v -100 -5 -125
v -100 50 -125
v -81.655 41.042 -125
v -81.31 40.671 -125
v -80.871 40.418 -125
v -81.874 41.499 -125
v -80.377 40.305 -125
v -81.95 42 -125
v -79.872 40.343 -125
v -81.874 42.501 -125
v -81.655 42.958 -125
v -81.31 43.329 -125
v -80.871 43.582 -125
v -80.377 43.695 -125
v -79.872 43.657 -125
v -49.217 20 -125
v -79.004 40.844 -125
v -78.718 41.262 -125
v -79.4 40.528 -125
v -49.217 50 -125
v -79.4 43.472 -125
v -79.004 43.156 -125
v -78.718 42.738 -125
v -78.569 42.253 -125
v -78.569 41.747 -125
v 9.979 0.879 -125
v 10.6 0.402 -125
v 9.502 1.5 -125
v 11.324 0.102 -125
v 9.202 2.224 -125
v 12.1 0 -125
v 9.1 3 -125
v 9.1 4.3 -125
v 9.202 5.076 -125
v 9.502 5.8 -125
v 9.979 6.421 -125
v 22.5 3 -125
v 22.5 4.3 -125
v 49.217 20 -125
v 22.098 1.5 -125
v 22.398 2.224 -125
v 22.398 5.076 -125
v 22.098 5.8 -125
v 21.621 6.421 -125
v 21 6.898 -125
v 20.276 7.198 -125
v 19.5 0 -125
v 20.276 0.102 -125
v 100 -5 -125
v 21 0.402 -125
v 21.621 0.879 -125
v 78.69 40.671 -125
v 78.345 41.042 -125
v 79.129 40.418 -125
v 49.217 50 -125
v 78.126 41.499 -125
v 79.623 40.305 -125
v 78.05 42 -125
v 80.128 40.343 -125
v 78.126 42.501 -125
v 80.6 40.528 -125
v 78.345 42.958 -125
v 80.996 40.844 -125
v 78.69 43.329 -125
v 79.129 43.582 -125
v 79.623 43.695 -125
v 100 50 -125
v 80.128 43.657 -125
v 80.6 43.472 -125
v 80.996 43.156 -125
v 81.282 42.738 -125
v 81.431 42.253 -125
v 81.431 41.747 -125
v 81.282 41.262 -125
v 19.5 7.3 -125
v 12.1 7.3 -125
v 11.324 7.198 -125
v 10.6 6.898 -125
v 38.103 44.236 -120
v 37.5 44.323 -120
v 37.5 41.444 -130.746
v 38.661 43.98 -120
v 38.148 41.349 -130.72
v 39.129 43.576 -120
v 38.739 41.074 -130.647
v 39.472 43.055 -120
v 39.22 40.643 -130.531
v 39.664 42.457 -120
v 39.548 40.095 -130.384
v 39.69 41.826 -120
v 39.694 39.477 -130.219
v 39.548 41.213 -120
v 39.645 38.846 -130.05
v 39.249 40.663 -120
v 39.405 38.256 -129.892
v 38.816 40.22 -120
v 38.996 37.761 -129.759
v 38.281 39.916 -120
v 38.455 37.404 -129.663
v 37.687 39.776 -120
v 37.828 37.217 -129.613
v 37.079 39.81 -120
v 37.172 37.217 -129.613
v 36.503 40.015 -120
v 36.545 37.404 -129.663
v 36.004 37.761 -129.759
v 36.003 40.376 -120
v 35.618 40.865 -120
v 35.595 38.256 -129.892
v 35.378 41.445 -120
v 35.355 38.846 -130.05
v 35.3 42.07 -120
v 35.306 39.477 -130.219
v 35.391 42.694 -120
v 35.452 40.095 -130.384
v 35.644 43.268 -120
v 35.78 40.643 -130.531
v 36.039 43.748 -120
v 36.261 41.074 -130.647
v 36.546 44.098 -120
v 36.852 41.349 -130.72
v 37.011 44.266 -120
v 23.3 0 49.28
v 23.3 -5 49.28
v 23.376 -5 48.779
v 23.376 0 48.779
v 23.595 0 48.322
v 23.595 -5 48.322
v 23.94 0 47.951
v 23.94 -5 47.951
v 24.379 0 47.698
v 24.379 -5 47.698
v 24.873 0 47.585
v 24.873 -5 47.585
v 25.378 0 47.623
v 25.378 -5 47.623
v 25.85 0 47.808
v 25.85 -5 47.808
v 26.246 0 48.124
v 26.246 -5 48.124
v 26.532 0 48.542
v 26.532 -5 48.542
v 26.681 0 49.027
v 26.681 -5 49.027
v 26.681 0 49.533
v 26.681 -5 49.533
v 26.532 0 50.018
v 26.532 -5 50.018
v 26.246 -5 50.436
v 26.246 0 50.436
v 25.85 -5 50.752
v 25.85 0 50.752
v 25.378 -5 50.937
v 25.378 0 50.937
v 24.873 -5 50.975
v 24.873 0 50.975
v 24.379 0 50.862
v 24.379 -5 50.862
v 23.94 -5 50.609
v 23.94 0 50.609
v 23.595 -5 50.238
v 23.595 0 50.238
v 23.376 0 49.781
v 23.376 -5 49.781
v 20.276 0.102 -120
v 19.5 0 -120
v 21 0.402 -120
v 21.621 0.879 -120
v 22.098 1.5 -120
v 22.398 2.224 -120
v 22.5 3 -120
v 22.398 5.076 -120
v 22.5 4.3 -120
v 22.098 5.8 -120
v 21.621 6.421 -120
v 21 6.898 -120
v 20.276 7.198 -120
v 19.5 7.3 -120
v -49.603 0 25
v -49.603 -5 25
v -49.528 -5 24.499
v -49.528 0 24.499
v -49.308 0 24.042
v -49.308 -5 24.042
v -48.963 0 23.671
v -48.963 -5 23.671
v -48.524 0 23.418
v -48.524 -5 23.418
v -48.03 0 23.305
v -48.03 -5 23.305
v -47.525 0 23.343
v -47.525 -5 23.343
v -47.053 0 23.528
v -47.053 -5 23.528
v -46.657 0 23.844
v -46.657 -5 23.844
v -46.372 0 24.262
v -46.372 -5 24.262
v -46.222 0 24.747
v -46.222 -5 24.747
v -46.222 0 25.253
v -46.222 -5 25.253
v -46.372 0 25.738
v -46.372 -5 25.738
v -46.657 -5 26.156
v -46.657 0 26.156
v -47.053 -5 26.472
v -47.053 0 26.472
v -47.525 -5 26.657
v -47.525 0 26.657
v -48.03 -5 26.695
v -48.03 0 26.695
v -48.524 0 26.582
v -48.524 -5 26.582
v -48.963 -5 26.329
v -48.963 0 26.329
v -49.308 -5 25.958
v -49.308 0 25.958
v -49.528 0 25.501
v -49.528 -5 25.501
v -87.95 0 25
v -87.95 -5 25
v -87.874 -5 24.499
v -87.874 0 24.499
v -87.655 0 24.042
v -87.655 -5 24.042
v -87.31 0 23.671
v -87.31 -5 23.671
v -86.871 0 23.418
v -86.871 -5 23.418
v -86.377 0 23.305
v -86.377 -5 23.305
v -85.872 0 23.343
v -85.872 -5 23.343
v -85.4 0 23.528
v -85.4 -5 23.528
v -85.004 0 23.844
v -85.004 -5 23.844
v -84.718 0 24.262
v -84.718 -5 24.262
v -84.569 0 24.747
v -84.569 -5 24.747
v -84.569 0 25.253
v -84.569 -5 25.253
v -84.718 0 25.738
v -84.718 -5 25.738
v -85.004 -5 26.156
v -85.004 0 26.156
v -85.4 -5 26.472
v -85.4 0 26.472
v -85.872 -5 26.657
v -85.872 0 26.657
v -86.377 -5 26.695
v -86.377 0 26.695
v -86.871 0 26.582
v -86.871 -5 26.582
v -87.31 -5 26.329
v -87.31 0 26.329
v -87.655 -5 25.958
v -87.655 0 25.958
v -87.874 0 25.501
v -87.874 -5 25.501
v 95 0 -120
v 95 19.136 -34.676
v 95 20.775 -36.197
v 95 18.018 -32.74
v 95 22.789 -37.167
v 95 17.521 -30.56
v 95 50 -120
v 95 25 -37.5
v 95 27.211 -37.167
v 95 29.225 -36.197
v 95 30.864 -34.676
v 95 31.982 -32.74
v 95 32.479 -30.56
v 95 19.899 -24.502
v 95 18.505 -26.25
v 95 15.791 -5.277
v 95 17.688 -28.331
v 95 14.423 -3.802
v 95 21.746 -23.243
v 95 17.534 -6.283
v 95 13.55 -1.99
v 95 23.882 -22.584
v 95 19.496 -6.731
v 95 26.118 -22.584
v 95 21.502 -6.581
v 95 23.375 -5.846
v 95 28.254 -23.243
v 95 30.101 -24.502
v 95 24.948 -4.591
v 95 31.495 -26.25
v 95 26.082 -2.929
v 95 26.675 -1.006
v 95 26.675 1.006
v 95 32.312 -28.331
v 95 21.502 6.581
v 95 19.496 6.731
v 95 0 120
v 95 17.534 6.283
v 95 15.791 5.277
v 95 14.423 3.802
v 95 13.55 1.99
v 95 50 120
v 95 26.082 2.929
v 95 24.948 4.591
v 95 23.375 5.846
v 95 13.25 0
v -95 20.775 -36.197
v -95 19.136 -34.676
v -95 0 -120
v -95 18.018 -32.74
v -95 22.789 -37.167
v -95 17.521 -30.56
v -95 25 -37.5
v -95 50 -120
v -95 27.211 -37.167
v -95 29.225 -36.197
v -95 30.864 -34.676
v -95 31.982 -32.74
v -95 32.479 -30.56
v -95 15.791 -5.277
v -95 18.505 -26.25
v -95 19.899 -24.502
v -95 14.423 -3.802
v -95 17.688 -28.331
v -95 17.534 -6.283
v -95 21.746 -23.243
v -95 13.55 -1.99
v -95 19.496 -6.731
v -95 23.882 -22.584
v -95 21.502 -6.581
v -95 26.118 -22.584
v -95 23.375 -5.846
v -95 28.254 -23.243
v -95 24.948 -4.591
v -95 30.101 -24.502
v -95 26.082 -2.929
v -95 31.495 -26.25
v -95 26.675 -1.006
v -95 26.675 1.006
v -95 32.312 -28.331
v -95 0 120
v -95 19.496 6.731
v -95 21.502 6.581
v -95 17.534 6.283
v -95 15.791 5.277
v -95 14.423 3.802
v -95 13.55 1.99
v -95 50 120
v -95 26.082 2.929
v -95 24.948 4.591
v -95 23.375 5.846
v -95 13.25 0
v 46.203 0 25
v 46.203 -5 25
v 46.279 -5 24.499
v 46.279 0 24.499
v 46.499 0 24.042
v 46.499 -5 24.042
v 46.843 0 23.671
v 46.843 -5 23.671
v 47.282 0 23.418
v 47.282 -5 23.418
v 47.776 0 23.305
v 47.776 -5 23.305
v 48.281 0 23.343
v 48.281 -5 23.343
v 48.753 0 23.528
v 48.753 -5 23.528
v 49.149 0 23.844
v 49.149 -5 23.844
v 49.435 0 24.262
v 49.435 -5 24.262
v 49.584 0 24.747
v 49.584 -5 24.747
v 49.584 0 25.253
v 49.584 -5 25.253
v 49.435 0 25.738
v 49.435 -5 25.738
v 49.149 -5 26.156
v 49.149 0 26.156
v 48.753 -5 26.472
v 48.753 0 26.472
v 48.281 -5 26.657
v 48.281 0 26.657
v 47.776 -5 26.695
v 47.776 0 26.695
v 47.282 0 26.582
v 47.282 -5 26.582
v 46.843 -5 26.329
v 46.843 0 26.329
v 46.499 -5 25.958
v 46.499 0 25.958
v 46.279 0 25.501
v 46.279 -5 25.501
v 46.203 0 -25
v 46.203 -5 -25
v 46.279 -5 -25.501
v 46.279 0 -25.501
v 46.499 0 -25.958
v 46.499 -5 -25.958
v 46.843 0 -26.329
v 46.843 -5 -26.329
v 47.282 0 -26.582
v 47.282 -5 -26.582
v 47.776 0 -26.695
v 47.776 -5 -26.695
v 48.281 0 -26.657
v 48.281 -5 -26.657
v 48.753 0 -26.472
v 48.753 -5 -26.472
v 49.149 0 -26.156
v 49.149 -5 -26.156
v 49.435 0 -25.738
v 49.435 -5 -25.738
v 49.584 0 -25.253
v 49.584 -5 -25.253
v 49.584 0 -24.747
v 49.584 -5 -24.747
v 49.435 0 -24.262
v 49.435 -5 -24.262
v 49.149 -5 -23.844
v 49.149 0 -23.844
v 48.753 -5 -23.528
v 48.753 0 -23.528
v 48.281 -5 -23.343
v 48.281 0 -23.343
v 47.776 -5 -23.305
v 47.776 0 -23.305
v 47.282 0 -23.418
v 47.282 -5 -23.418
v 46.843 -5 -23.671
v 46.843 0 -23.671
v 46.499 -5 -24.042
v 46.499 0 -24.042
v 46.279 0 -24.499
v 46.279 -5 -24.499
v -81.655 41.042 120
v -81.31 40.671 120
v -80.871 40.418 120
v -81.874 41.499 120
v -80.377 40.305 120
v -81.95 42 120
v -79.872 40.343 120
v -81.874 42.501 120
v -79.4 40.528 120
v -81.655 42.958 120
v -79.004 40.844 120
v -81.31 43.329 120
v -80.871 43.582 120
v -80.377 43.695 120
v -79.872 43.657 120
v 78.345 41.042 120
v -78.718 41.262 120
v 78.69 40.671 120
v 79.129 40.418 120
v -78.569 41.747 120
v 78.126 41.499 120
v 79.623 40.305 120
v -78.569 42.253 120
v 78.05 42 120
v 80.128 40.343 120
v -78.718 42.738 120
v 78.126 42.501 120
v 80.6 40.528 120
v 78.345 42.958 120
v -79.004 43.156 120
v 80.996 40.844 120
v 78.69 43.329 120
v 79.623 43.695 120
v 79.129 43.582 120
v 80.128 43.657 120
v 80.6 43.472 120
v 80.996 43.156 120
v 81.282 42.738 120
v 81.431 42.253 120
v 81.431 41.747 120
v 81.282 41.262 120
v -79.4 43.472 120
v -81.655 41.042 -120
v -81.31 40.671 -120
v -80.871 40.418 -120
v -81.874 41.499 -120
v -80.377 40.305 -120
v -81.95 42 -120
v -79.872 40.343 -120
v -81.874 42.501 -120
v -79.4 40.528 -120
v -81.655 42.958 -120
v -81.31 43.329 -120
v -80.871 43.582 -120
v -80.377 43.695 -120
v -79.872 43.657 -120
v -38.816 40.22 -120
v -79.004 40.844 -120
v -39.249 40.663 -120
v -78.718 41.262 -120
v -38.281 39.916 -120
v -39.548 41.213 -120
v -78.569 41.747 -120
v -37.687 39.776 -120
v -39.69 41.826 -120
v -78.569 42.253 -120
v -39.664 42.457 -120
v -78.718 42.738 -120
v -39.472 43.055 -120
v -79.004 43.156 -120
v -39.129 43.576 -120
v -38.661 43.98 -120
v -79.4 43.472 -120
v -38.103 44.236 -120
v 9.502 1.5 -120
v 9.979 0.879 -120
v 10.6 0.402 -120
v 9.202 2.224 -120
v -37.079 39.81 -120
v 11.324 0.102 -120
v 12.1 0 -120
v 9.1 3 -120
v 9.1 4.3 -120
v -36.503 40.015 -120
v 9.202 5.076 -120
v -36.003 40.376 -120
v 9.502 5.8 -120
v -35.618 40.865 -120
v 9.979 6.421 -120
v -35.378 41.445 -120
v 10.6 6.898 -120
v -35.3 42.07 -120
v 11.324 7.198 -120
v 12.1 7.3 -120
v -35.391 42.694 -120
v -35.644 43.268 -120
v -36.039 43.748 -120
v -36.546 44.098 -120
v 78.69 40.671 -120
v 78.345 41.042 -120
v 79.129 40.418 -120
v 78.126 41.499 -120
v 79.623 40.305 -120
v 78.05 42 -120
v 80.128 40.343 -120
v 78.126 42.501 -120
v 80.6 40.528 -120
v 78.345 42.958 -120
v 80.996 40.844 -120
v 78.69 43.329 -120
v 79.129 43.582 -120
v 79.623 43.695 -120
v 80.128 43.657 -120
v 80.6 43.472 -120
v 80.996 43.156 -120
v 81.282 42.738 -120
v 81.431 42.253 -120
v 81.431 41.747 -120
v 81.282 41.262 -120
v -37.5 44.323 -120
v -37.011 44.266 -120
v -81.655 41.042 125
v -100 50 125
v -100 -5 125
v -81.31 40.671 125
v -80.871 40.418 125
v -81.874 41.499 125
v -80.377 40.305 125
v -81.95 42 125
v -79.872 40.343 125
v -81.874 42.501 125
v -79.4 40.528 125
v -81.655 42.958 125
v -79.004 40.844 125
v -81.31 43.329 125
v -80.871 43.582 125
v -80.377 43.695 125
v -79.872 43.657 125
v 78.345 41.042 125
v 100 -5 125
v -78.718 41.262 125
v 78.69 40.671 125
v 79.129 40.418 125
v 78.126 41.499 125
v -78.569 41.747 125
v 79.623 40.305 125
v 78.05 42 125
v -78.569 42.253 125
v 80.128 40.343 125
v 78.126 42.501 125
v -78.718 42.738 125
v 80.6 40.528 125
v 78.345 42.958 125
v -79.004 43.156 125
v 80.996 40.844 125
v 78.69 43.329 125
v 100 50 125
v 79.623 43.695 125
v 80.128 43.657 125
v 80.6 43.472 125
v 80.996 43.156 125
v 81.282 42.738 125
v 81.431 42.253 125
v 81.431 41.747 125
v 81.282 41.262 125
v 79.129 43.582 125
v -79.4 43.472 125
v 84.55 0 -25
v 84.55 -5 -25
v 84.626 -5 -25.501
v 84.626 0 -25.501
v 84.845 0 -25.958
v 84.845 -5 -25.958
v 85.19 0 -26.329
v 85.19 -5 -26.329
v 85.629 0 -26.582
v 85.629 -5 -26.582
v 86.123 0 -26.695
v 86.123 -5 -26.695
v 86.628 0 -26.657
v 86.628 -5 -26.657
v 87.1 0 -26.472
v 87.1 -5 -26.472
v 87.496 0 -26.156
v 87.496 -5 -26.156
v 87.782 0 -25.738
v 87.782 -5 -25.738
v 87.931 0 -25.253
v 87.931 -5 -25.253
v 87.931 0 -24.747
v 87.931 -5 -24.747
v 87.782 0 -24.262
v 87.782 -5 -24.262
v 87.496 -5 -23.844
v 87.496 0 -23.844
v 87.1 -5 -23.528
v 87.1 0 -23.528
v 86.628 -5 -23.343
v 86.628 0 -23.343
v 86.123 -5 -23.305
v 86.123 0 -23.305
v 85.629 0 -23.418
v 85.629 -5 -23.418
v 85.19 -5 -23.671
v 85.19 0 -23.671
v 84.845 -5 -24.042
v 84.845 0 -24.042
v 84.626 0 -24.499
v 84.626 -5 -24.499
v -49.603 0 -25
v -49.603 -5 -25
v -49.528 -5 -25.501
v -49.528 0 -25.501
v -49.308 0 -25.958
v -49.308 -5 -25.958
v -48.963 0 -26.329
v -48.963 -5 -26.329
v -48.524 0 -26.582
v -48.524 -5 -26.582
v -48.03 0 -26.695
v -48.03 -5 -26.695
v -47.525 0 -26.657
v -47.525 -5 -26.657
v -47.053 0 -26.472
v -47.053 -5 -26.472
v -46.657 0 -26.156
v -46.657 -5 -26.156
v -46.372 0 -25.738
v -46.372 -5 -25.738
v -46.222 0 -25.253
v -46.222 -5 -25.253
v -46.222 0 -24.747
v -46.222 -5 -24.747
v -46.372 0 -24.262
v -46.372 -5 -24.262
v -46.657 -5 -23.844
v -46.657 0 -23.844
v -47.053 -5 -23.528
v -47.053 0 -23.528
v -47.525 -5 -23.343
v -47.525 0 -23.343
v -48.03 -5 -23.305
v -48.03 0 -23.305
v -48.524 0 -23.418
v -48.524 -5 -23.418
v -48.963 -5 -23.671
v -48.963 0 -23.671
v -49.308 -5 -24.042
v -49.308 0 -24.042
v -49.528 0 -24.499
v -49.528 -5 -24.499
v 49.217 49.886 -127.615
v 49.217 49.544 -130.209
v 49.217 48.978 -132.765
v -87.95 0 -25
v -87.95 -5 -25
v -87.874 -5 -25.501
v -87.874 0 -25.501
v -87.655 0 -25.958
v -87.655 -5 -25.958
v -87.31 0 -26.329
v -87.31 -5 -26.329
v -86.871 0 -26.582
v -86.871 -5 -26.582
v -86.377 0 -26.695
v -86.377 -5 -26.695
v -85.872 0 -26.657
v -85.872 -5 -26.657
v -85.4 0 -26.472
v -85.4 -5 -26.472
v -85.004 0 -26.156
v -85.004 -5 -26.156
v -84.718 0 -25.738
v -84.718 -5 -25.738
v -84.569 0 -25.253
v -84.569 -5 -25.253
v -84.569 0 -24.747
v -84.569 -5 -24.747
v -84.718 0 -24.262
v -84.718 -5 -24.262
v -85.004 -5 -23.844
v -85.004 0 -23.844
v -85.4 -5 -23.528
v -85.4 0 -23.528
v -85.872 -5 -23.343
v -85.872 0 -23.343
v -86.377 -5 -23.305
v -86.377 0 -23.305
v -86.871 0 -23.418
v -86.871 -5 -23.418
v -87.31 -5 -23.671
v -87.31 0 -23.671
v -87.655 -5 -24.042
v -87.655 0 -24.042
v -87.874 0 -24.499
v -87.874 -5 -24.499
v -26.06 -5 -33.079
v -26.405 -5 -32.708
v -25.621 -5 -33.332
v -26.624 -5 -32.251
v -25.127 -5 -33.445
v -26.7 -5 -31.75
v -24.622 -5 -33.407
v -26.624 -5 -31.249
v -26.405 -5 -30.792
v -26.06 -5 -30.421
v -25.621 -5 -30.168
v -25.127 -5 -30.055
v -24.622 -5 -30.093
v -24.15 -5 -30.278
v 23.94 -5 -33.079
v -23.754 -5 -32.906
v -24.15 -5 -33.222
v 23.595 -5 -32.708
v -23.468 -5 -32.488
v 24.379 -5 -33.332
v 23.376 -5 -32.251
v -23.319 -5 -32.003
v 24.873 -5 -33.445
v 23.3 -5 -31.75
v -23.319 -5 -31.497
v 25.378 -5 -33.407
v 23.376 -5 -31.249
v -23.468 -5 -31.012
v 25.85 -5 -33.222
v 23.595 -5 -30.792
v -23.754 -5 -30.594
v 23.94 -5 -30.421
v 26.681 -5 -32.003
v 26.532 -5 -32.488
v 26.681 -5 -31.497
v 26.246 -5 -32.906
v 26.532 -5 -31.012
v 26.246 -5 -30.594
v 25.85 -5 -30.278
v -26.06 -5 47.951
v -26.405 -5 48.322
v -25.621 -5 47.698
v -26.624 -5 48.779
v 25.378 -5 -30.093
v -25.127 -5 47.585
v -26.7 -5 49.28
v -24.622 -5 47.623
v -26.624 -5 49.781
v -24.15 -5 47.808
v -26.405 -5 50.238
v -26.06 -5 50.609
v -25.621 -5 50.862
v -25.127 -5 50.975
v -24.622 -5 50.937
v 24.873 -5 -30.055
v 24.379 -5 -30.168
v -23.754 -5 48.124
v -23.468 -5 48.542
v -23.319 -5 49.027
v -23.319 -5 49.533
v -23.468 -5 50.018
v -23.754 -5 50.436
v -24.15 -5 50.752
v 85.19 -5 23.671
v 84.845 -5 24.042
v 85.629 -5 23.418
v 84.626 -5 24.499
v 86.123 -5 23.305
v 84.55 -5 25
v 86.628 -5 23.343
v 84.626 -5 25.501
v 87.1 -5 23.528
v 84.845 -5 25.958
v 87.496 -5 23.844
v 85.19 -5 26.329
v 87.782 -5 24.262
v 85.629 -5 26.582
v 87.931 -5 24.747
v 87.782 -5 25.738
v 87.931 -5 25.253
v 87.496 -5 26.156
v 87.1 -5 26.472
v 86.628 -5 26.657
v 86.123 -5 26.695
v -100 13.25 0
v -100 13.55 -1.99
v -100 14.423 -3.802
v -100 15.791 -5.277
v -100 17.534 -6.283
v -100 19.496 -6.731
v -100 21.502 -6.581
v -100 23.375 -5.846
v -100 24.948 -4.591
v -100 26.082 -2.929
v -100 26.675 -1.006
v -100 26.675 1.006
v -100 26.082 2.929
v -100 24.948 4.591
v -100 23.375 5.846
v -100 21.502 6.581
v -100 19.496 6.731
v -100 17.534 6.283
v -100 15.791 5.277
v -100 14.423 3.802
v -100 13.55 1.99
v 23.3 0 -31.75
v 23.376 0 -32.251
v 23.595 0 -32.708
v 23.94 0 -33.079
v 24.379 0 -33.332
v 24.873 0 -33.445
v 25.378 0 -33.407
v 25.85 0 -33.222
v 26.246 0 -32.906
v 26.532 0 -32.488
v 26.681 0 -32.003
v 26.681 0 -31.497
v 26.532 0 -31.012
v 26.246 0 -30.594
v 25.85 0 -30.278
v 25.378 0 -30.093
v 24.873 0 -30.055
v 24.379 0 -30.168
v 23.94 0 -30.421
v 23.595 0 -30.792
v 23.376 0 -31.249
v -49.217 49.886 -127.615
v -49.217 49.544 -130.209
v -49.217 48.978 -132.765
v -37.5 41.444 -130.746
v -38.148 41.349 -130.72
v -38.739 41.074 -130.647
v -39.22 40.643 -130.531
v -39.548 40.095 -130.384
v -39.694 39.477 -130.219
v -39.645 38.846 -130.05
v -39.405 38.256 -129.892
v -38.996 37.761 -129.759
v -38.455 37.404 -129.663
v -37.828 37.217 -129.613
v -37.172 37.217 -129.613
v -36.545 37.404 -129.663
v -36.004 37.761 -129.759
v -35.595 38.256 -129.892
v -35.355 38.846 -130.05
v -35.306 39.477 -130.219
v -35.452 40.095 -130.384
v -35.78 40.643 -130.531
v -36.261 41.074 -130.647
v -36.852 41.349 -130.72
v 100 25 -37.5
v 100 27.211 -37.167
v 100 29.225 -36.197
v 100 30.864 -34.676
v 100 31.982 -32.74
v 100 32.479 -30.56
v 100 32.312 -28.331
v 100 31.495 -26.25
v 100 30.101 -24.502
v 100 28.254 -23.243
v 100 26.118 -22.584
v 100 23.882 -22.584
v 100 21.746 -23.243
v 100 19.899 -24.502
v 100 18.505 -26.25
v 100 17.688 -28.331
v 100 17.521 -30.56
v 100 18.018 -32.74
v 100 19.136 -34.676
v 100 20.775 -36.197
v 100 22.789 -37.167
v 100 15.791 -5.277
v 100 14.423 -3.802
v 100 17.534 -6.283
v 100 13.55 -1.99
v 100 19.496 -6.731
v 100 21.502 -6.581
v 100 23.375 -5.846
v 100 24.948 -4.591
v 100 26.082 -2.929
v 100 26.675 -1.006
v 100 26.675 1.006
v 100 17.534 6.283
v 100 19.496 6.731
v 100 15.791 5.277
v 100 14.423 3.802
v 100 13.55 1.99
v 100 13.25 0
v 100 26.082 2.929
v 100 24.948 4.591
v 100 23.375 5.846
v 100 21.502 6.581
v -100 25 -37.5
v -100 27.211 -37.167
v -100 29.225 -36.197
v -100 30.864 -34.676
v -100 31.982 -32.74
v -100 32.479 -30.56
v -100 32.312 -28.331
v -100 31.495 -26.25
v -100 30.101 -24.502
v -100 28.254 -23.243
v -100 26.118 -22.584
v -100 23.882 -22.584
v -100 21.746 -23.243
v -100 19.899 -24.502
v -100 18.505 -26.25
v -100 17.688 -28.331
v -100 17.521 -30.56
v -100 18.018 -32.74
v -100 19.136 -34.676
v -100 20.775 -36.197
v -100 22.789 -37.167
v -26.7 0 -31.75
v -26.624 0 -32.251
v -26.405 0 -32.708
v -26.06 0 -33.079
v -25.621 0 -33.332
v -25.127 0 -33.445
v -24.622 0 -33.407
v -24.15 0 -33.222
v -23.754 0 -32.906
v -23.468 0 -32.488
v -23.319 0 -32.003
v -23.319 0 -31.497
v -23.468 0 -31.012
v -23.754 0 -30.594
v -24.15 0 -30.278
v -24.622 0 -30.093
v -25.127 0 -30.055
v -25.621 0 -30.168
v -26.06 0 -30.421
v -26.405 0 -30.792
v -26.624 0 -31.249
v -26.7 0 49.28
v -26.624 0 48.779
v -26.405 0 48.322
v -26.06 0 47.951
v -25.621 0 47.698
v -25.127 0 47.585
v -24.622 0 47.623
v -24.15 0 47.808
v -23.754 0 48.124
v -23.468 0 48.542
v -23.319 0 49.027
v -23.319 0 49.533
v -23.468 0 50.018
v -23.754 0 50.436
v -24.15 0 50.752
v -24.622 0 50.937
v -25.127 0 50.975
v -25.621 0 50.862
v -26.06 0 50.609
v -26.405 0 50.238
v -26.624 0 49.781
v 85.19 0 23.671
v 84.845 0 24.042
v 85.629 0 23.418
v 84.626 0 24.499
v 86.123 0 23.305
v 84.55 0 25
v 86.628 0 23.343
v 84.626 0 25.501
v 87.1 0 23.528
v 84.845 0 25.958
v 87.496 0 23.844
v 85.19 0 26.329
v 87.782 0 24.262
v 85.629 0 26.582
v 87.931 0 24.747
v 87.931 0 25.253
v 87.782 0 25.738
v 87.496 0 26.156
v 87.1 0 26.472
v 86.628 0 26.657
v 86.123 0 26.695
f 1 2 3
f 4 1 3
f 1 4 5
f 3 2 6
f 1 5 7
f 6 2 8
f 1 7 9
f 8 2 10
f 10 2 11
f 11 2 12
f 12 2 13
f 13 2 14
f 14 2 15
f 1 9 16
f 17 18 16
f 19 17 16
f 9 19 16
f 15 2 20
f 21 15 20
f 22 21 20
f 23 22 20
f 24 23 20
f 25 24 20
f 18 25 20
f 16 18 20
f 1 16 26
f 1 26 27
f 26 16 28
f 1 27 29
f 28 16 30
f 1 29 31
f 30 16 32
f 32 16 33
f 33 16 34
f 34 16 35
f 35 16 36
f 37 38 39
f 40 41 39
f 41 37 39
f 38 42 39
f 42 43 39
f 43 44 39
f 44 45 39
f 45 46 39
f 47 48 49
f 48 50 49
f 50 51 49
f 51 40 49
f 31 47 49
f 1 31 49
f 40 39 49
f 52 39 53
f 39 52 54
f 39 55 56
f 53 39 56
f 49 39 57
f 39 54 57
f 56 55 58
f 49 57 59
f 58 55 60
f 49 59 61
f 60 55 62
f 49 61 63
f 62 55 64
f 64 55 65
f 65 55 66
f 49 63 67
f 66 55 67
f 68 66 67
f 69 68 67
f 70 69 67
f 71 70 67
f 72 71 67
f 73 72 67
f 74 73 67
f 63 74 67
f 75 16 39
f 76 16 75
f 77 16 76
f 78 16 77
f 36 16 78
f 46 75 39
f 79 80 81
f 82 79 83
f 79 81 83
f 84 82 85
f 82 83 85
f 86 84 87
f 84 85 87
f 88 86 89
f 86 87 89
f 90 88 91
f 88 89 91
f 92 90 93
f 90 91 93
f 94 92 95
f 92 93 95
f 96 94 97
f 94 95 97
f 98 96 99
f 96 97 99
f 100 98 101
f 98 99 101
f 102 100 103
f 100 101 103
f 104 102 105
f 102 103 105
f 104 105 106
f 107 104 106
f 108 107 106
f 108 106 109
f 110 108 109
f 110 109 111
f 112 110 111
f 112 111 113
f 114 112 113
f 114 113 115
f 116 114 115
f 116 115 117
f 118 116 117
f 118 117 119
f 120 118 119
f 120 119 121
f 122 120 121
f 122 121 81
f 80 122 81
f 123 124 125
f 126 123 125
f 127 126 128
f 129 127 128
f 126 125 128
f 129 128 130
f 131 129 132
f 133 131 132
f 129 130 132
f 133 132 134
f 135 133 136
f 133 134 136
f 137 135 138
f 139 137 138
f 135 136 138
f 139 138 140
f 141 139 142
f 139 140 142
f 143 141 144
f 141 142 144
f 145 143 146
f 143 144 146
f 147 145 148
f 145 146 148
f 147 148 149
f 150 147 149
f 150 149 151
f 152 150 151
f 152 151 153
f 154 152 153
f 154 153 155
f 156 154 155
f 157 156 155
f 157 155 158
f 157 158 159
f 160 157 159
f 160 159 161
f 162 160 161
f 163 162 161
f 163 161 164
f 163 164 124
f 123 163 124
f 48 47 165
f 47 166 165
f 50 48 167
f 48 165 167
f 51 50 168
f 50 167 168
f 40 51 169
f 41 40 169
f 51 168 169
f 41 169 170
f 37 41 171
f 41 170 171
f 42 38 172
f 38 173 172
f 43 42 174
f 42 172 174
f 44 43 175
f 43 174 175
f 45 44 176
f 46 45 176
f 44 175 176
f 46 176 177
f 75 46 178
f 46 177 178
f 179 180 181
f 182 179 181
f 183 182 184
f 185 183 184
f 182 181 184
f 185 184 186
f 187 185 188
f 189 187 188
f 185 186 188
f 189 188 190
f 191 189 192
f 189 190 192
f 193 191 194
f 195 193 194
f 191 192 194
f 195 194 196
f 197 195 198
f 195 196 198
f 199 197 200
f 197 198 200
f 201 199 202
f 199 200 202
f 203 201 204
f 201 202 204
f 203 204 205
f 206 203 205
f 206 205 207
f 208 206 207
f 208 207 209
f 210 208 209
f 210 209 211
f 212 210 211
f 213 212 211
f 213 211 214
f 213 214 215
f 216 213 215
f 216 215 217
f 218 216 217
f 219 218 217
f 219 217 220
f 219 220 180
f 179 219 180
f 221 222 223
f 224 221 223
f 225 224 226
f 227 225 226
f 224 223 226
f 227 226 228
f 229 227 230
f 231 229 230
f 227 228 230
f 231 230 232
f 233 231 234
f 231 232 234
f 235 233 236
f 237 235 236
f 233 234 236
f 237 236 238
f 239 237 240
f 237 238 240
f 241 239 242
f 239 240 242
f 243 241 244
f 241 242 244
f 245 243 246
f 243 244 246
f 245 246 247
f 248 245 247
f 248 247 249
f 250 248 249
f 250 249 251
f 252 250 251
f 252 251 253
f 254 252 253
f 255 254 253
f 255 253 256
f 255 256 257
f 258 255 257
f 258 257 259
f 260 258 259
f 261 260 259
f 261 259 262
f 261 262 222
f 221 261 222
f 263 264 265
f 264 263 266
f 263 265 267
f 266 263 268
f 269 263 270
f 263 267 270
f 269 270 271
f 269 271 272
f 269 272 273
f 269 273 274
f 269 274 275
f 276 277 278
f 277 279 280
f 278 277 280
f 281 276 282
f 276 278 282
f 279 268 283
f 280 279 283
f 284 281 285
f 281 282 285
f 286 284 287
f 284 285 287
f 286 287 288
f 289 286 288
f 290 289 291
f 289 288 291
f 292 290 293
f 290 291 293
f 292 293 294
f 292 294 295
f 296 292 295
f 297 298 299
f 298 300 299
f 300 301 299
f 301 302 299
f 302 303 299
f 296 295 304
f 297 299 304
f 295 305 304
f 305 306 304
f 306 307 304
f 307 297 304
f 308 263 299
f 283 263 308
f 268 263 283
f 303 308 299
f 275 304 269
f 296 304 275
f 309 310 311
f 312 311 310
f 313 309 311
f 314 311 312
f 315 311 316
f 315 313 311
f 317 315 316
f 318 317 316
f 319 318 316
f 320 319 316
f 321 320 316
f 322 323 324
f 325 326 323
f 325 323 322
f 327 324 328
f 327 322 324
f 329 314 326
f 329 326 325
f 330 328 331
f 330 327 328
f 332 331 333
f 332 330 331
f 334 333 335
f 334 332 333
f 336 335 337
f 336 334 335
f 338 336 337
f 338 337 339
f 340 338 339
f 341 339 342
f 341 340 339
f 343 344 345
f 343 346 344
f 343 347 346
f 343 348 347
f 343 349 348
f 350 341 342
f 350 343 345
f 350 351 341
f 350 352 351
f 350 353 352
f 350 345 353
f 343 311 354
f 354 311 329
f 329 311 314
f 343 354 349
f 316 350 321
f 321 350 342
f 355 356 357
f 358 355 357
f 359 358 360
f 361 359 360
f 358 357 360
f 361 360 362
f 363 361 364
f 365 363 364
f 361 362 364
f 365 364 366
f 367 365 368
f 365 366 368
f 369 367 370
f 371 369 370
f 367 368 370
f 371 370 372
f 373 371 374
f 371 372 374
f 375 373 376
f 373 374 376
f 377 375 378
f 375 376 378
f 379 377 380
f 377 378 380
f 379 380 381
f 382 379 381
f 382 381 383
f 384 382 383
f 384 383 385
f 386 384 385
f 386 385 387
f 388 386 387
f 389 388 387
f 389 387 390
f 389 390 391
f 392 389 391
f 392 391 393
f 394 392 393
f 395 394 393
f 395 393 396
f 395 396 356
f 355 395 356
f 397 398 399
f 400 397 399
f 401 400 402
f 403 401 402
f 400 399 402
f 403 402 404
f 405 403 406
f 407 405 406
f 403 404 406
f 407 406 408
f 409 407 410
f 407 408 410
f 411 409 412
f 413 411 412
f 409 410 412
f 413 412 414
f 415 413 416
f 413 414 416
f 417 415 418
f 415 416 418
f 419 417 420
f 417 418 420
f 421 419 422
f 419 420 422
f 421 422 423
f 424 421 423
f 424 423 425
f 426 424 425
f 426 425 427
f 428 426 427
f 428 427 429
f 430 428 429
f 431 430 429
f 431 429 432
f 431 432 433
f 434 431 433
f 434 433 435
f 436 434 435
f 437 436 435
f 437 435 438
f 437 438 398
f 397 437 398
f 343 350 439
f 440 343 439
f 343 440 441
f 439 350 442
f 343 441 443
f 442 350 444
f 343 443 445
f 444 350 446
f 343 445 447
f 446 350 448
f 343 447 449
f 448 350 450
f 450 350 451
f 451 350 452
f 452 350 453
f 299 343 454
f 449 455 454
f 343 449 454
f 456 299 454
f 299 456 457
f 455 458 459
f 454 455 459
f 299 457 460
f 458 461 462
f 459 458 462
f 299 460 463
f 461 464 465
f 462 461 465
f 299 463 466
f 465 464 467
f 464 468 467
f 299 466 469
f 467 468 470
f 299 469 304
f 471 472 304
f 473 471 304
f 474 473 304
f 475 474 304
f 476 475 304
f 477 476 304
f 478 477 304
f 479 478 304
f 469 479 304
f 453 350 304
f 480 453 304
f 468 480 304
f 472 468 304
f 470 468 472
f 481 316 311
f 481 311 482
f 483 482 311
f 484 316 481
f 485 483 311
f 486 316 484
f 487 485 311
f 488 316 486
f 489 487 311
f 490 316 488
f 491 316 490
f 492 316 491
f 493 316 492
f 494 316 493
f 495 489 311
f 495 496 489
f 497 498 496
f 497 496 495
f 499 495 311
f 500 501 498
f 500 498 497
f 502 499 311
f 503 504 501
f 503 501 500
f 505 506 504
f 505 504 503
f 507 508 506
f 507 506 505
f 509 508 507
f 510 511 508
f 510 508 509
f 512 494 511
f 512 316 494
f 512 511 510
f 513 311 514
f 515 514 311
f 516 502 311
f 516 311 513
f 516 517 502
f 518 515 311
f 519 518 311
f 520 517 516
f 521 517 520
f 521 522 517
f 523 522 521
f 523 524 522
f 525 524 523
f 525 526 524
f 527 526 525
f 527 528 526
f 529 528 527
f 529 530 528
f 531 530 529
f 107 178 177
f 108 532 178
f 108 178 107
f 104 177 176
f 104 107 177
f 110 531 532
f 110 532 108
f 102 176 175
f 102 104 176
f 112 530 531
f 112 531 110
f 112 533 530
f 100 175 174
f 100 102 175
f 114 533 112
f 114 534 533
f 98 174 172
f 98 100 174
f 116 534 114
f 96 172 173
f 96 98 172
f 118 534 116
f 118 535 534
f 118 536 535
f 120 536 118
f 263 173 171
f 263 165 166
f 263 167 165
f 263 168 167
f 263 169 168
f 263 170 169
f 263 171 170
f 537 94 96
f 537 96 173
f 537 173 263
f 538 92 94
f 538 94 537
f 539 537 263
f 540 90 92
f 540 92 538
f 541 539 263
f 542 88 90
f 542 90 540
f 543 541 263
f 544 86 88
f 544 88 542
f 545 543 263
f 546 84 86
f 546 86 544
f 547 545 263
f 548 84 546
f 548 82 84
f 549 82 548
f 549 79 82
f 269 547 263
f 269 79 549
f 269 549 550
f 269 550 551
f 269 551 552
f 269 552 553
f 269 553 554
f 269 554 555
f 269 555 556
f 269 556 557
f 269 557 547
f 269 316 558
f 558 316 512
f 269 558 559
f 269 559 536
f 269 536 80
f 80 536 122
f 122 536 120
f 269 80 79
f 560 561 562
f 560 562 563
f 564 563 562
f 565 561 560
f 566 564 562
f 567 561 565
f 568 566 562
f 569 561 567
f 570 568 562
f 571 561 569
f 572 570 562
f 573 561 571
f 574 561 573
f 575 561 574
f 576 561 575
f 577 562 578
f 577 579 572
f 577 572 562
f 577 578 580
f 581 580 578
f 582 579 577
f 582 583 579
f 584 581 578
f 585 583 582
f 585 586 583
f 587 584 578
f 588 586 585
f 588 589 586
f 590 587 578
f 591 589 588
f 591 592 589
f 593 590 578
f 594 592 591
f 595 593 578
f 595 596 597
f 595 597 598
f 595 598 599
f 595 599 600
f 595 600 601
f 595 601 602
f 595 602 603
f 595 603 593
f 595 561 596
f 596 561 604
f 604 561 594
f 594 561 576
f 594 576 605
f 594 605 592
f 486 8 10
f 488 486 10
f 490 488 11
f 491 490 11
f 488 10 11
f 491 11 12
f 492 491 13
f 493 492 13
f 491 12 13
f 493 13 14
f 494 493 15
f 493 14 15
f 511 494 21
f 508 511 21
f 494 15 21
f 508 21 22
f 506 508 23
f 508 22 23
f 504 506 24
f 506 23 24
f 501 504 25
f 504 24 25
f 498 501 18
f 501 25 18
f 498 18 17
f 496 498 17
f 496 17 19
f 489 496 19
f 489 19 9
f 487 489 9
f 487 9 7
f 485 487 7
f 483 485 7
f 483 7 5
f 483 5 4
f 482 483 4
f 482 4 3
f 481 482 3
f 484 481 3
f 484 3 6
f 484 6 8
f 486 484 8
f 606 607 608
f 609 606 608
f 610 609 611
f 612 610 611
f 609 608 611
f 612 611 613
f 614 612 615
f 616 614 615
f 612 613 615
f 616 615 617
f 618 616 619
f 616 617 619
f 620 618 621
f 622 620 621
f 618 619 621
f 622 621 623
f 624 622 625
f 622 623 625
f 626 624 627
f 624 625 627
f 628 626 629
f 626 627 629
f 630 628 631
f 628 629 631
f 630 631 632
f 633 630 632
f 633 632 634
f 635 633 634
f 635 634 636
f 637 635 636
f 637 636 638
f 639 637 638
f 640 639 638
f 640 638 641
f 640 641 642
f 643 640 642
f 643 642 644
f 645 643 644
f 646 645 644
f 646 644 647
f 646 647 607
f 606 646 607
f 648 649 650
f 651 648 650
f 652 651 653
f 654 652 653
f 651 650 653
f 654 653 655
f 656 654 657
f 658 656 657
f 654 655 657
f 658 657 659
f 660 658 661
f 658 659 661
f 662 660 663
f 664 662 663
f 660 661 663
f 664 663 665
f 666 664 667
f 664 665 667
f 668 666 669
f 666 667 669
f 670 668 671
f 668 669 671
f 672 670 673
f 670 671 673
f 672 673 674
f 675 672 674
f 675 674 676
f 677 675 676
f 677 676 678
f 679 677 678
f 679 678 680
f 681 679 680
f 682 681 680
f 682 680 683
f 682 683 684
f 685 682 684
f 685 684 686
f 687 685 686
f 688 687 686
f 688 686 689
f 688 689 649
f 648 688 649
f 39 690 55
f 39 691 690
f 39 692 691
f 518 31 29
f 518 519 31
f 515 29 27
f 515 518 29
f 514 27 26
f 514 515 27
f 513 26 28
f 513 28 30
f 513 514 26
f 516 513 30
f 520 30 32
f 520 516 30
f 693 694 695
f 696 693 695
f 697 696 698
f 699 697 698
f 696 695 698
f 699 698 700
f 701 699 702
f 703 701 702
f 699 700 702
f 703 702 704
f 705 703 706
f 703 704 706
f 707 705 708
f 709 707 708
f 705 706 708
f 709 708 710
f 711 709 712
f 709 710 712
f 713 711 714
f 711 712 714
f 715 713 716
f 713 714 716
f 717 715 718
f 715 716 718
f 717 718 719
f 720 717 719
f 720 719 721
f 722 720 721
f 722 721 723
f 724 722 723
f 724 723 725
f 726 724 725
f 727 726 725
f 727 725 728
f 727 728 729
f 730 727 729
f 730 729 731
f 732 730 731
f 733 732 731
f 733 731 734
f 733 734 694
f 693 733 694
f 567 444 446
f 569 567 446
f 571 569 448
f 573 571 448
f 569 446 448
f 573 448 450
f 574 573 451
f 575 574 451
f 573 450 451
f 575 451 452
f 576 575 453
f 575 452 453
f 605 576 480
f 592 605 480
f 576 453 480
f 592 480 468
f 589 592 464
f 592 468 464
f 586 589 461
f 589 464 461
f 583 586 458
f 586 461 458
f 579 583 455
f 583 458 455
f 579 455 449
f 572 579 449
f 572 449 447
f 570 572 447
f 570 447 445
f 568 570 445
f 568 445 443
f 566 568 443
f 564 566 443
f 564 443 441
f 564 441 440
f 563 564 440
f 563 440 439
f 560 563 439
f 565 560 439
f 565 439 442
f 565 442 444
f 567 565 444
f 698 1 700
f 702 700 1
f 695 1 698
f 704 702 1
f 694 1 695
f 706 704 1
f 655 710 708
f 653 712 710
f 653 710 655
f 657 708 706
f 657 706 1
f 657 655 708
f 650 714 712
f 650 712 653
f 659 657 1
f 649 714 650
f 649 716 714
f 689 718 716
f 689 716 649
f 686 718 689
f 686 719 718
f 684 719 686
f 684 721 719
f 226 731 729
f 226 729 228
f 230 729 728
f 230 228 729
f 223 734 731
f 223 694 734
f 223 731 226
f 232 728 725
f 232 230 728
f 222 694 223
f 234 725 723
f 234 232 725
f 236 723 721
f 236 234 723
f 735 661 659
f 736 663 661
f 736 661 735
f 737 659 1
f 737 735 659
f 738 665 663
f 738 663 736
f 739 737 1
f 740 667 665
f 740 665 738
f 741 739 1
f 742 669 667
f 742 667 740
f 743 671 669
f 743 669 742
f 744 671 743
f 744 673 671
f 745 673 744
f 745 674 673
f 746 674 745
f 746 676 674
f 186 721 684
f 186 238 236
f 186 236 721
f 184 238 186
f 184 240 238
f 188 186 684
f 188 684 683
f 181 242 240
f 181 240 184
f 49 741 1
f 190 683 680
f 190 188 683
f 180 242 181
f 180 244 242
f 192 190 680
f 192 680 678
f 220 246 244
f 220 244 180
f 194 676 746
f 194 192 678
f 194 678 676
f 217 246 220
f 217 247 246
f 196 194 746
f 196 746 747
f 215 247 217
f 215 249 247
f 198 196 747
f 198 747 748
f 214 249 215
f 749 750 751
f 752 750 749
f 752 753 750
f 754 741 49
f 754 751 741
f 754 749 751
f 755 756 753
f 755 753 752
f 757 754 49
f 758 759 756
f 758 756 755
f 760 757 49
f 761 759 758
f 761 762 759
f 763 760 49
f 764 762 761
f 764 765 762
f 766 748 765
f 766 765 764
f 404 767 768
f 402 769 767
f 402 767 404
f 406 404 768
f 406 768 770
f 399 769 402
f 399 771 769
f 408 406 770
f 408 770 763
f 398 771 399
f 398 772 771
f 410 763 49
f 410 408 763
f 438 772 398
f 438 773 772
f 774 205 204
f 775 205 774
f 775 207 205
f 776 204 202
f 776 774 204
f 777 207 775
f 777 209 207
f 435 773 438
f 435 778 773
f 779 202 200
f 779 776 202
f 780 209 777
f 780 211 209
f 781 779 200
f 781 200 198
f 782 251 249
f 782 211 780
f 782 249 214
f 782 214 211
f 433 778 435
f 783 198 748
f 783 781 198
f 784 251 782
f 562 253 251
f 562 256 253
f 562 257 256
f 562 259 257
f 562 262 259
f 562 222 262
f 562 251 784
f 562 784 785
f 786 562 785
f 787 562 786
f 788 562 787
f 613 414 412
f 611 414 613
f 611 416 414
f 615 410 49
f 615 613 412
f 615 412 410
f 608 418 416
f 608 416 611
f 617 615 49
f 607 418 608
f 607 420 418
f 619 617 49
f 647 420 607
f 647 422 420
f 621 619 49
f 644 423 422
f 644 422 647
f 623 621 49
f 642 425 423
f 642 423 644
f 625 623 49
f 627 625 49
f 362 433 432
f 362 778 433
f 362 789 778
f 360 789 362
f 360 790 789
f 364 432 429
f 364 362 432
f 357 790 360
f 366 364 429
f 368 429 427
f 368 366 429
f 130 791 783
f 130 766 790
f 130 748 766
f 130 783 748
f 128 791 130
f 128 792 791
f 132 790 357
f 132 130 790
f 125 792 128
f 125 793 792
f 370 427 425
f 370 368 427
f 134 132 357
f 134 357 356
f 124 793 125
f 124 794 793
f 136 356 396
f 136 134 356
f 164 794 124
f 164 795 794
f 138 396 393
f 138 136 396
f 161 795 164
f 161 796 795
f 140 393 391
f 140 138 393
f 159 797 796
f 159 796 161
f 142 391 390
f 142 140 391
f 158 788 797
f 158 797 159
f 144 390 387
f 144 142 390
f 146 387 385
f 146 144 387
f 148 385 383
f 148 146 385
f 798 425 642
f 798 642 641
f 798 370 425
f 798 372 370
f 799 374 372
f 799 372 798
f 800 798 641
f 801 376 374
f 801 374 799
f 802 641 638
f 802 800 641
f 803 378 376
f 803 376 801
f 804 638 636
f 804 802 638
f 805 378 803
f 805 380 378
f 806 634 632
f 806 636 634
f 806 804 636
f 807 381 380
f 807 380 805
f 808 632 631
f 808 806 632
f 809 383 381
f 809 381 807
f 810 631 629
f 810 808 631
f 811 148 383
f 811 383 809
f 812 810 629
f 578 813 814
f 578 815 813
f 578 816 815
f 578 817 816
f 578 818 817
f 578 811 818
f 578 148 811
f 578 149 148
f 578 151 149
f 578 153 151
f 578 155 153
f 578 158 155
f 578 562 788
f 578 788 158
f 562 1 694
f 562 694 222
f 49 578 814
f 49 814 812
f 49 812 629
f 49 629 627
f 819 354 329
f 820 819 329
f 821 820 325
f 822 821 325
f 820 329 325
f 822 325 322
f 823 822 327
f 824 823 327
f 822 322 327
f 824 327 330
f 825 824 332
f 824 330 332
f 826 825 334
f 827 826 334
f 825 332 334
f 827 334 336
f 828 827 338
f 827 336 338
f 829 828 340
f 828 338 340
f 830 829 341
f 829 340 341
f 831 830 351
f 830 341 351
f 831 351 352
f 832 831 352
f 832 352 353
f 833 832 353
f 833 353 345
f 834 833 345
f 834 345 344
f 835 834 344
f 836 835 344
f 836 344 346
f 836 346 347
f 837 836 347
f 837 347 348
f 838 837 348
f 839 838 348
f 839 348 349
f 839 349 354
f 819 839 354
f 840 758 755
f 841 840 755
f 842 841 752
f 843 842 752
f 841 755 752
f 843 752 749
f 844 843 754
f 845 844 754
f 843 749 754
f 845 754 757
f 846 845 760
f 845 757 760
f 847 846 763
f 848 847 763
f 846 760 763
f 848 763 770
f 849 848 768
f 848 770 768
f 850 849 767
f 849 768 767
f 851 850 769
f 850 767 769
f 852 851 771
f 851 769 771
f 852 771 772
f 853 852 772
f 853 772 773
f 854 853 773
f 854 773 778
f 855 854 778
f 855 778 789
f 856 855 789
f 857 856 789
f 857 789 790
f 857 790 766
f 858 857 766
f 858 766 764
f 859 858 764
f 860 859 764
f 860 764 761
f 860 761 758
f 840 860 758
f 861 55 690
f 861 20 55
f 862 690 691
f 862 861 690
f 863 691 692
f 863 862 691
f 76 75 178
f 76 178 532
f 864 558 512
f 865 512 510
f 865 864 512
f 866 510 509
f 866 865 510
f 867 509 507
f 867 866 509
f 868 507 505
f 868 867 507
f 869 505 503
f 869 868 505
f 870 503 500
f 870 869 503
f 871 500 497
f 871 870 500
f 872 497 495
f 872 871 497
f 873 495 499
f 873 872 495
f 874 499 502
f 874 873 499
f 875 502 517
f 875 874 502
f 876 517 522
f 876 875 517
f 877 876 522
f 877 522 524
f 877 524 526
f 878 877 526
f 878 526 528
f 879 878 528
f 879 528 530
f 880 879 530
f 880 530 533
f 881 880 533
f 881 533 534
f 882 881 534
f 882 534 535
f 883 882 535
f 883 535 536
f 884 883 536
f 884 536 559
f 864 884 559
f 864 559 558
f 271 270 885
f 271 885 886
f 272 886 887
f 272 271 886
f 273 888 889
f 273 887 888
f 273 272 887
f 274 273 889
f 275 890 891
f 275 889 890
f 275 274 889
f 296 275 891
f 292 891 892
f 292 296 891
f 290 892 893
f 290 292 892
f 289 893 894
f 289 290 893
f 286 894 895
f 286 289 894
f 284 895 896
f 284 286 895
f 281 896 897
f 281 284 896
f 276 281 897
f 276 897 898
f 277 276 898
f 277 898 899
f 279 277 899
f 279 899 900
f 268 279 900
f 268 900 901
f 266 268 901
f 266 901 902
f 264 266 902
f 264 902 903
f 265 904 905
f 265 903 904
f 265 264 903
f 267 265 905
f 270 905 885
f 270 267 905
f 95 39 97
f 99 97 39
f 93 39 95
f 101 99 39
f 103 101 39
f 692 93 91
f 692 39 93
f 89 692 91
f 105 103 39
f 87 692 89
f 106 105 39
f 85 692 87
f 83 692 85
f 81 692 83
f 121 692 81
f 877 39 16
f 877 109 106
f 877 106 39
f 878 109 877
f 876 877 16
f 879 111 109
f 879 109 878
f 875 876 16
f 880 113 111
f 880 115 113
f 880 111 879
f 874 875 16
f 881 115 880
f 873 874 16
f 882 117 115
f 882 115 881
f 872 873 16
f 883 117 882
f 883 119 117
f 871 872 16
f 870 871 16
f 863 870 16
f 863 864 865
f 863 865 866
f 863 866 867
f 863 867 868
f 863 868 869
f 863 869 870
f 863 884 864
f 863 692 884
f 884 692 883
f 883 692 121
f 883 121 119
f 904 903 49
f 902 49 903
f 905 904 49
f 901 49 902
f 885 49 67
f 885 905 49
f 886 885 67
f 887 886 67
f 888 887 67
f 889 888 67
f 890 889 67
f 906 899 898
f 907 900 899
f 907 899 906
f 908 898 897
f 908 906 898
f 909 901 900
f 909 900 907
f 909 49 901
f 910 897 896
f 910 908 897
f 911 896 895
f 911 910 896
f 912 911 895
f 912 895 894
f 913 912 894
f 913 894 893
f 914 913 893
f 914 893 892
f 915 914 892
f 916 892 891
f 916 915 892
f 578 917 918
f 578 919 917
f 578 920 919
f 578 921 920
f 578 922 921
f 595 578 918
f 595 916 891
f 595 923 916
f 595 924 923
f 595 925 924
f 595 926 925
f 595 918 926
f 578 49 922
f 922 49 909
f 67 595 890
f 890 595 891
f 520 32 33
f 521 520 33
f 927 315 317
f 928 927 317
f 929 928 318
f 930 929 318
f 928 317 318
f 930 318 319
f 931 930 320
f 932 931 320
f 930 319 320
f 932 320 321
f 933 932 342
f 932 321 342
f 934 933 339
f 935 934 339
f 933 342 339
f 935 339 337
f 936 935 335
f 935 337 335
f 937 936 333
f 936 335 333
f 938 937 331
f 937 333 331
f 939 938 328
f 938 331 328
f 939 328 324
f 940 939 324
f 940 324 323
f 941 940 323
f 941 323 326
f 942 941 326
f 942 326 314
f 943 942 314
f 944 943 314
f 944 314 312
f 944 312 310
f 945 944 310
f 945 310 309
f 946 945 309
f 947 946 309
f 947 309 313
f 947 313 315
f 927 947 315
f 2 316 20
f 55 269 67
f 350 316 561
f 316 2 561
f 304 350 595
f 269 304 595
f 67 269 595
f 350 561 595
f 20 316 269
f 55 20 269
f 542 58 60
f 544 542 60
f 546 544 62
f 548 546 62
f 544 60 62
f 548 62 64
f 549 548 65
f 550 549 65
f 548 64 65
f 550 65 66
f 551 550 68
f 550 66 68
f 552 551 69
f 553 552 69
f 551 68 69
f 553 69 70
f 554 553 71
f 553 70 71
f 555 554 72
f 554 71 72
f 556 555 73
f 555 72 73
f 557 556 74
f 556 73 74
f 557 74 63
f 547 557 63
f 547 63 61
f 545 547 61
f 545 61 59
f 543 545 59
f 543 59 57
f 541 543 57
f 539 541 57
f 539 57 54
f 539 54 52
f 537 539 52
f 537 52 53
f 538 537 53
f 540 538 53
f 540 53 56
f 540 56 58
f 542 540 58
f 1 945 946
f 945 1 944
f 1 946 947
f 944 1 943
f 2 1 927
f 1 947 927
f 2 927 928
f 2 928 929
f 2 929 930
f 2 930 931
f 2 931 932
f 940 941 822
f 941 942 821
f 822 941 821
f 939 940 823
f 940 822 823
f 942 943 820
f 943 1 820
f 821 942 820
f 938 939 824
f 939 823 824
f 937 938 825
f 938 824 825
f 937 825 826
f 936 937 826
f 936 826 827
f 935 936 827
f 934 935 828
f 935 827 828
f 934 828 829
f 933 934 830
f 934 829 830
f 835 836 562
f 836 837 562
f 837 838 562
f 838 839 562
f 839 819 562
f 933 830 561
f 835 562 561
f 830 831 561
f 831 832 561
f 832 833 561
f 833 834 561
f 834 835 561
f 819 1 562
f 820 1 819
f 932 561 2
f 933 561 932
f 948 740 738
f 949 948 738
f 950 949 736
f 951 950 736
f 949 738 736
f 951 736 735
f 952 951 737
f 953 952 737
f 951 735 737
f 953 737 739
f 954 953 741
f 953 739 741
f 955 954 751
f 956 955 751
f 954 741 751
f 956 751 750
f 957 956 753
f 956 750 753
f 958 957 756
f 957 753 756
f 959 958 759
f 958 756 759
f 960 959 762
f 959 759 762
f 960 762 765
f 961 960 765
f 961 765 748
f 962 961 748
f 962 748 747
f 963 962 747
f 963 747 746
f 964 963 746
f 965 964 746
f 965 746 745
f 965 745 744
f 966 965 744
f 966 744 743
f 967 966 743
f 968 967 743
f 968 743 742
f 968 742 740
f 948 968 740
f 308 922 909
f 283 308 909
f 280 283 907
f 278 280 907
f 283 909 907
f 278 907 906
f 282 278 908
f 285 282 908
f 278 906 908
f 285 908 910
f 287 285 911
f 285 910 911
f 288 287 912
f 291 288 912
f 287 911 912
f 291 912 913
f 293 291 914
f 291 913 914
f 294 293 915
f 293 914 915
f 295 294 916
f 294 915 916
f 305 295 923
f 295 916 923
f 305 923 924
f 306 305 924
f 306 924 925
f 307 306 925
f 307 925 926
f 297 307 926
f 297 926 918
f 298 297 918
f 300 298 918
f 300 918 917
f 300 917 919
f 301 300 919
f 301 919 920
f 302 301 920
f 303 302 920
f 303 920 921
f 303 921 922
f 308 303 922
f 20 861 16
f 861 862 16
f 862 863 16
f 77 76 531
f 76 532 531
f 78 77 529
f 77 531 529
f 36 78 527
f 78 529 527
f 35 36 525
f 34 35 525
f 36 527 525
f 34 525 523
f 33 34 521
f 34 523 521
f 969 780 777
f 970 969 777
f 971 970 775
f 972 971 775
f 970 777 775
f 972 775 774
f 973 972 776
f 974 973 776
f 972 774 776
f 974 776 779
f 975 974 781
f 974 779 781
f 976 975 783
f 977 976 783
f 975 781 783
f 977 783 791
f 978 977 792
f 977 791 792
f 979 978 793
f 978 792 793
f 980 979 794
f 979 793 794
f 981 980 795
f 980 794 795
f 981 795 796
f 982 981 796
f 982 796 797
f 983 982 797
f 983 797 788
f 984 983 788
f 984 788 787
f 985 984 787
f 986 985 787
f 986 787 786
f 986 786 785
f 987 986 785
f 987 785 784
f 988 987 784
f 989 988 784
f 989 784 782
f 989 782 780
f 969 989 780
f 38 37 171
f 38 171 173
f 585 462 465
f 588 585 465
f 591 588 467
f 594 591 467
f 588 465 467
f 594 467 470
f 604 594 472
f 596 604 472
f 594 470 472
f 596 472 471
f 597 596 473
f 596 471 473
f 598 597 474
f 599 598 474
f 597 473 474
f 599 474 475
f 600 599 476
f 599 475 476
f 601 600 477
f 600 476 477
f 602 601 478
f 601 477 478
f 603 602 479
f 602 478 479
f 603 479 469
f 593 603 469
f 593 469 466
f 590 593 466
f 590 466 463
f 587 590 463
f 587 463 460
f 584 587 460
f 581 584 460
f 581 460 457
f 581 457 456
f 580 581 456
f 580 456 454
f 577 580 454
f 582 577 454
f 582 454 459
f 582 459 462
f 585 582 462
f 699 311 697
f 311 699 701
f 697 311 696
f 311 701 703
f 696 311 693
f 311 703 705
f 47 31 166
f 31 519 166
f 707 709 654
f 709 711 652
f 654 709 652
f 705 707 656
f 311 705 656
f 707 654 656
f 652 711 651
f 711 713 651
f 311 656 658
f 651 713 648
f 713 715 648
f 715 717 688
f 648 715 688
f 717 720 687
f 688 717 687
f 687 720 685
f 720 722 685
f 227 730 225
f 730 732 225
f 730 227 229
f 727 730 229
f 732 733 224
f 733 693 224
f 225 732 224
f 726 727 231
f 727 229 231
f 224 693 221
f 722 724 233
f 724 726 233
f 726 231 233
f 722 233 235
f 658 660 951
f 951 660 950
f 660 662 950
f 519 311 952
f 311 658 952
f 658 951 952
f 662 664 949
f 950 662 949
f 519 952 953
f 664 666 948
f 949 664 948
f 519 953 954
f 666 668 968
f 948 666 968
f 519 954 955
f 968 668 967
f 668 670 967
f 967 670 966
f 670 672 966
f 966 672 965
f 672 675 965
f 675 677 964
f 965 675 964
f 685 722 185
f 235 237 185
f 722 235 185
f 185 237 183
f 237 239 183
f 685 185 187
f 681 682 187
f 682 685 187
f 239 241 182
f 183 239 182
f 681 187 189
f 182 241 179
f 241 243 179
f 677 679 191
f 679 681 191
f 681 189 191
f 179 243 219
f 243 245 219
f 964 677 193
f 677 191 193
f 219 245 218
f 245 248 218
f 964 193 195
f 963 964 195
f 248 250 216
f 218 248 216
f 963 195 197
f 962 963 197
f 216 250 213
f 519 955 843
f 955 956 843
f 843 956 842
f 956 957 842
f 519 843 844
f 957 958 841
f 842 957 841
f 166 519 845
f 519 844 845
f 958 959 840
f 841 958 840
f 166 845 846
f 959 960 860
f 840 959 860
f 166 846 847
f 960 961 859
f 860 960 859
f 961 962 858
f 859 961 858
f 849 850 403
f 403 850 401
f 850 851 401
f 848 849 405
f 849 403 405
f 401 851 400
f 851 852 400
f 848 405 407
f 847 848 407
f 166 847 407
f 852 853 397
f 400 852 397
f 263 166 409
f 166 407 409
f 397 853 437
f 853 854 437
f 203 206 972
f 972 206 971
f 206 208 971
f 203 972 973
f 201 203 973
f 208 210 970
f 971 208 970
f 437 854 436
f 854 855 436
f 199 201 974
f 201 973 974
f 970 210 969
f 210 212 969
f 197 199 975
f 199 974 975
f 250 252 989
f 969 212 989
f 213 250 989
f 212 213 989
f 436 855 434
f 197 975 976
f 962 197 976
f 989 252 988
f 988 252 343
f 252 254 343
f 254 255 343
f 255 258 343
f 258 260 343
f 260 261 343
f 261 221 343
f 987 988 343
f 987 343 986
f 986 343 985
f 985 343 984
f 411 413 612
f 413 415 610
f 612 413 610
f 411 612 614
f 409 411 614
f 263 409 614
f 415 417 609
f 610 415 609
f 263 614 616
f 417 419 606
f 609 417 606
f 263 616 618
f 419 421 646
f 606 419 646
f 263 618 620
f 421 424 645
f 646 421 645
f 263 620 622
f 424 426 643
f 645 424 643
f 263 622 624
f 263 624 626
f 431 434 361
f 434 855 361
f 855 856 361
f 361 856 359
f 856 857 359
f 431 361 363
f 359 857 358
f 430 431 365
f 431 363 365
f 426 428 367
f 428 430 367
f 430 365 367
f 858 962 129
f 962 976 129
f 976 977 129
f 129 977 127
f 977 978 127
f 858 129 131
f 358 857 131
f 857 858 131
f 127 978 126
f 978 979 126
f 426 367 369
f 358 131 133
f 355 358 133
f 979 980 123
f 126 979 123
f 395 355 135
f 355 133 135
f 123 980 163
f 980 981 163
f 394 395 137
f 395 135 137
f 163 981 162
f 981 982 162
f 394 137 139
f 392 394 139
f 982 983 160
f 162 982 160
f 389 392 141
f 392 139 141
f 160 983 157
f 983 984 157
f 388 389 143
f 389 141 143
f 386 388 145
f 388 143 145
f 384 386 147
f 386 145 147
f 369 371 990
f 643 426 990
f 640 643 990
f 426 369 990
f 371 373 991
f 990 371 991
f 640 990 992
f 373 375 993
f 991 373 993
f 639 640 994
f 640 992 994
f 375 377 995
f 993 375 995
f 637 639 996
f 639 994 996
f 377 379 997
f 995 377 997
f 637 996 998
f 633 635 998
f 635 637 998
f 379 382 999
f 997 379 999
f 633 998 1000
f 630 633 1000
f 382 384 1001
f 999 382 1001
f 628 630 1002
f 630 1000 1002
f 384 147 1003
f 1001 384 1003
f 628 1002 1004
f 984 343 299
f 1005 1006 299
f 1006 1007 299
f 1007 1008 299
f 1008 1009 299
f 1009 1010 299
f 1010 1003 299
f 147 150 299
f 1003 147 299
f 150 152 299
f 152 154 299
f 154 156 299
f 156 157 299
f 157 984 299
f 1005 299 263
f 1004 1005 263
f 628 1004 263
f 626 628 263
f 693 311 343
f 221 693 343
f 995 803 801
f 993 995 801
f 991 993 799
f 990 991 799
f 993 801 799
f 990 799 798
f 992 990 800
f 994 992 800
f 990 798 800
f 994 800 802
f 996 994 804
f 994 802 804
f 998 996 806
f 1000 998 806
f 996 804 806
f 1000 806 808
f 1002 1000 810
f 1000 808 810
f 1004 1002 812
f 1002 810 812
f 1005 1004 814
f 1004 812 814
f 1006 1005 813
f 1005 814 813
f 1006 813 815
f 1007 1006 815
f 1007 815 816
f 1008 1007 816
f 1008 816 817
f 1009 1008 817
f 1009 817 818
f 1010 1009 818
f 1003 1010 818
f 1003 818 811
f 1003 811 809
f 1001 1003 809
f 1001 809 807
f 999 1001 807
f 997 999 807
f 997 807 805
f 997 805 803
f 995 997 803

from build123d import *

# Parameters (mm, degrees)
SKETCH1_W               = 190
SKETCH1_H               = 50
BOSS_EXTRUDE1_DEPTH     = 120
SHELL1_T                = 5
SKETCH3_R               = 6.75
CUT_EXTRUDE2_DEPTH      = 242.091269025
CUT_EXTRUDE2_DEPTH_BACK = 242.091269025
M3_CLEARANCE_HOLE1_D    = 3.4
SKETCH8_R               = 7.5
CUT_EXTRUDE4_DEPTH      = 168.705098312
CUT_EXTRUDE4_DEPTH_BACK = 168.705098312
SKETCH10_W              = 13.4
SKETCH10_H              = 7.3
CUT_EXTRUDE6_DEPTH      = 5
FILLET1_R               = 3
SKETCH11_W              = 98.43460289
SKETCH11_H              = 30
REVOLVE1_ANGLE          = 15
CUT_EXTRUDE7_REACH      = 271.031
SKETCH12_R              = 2.2
M3_CLEARANCE_HOLE3_D    = 3.4


with BuildPart() as part:
    # Sketch1 → Boss-Extrude1 (new, symmetric)
    with BuildSketch(Plane.XY):
        with Locations((0, 25)):
            Rectangle(SKETCH1_W, SKETCH1_H)
    extrude(amount=BOSS_EXTRUDE1_DEPTH, both=True)

    # Shell1
    shell1_openings = [part.faces().sort_by_distance(p)[0] for p in [
        (0, 50, 0),
    ]]
    offset(amount=SHELL1_T, openings=shell1_openings, kind=Kind.INTERSECTION)

    # Sketch3 → Cut-Extrude2 (cut, two sides)
    with BuildSketch(Plane(origin=(100, 0, 0), x_dir=(0, 0, -1), z_dir=(1, 0, 0))) as cut_extrude2_sk:
        with Locations(Location((0, 20, 0), (0, 0, 270))):
            Circle(SKETCH3_R)
    extrude(amount=CUT_EXTRUDE2_DEPTH, mode=Mode.SUBTRACT)
    extrude(cut_extrude2_sk.sketch, amount=-CUT_EXTRUDE2_DEPTH_BACK, mode=Mode.SUBTRACT)

    # M3 Clearance Hole1 (through all)
    with Locations(Plane.XY.offset(125)):
        with Locations((-80.25, 42), (79.75, 42)):
            Hole(M3_CLEARANCE_HOLE1_D / 2)

    # Sketch8 → Cut-Extrude4 (cut, two sides)
    with BuildSketch(Plane(origin=(0, 0, 0), x_dir=(0, 0, -1), z_dir=(1, 0, 0))) as cut_extrude4_sk:
        with Locations((30, 25)):
            Circle(SKETCH8_R)
    extrude(amount=CUT_EXTRUDE4_DEPTH, mode=Mode.SUBTRACT)
    extrude(cut_extrude4_sk.sketch, amount=-CUT_EXTRUDE4_DEPTH_BACK, mode=Mode.SUBTRACT)

    # Sketch10 → Cut-Extrude6 (cut)
    with BuildSketch(Plane(origin=(0, 0, -125), x_dir=(-1, 0, 0), z_dir=(0, 0, -1))):
        with Locations((-15.8, 3.65)):
            Rectangle(SKETCH10_W, SKETCH10_H)
    extrude(amount=-CUT_EXTRUDE6_DEPTH, mode=Mode.SUBTRACT)

    # Fillet1
    fillet1_edges = [part.edges().sort_by_distance(p)[0] for p in [
        (22.5, 0, -122.5),
        (22.5, 7.3, -122.5),
        (9.1, 7.3, -122.5),
        (9.1, 0, -122.5),
    ]]
    fillet(fillet1_edges, radius=FILLET1_R)

    # Sketch11 → Revolve1 (revolve)
    with BuildSketch(Plane(origin=(0, 0, -125), x_dir=(-1, 0, 0), z_dir=(0, 0, -1))):
        with Locations((0, 35)):
            Rectangle(SKETCH11_W, SKETCH11_H)
    revolve(axis=Axis((49.217301445, 20, -125), (-1, 0, 0)), revolution_arc=REVOLVE1_ANGLE)

    # Cut-Extrude7: up to this plane
    cut_extrude7_end = Plane(origin=(0, 0, -120), z_dir=(0, 0, -1))
    # Sketch12 → Cut-Extrude7 (cut, up to the surface)
    with BuildSketch(Plane(origin=(0, -29.910254038, -111.626587737), x_dir=(-1, 0, 0), z_dir=(0, -0.25881904510252135, -0.9659258262890682)), mode=Mode.PRIVATE) as cut_extrude7_sk1:
        with Locations(Location((-37.5, 71.670897164, 0), (0, 0, 90))):
            Circle(SKETCH12_R)
    cut_extrude7_tool1 = split(extrude(cut_extrude7_sk1.sketch, amount=-CUT_EXTRUDE7_REACH, mode=Mode.PRIVATE), bisect_by=cut_extrude7_end, keep=Keep.BOTH, mode=Mode.PRIVATE)
    cut_extrude7 = cut_extrude7_tool1.solids().sort_by_distance((37.5, 39.318517, -130.176381))[0]
    add(cut_extrude7, mode=Mode.SUBTRACT)

    # Mirror2: Cut-Extrude7 across plane
    add(cut_extrude7.mirror(Plane(origin=(0, 0, 0), x_dir=(0, 0, 1), z_dir=(1, 0, 0))), mode=Mode.SUBTRACT)

    # M3 Clearance Hole3 (through all)
    with Locations(Plane(origin=(0, 5, 0), x_dir=(1, 0, 0), z_dir=(0, 1, 0))):
        with Locations((-47.903181707, 25), (-86.25, 25), (-47.903181707, -25), (-86.25, -25), (25, -49.28), (47.903181707, -25), (86.25, -25), (86.25, 25), (47.903181707, 25), (25, 31.75), (-25, 31.75), (-25, -49.28)):
            Hole(M3_CLEARANCE_HOLE3_D / 2)


solid = part.part
